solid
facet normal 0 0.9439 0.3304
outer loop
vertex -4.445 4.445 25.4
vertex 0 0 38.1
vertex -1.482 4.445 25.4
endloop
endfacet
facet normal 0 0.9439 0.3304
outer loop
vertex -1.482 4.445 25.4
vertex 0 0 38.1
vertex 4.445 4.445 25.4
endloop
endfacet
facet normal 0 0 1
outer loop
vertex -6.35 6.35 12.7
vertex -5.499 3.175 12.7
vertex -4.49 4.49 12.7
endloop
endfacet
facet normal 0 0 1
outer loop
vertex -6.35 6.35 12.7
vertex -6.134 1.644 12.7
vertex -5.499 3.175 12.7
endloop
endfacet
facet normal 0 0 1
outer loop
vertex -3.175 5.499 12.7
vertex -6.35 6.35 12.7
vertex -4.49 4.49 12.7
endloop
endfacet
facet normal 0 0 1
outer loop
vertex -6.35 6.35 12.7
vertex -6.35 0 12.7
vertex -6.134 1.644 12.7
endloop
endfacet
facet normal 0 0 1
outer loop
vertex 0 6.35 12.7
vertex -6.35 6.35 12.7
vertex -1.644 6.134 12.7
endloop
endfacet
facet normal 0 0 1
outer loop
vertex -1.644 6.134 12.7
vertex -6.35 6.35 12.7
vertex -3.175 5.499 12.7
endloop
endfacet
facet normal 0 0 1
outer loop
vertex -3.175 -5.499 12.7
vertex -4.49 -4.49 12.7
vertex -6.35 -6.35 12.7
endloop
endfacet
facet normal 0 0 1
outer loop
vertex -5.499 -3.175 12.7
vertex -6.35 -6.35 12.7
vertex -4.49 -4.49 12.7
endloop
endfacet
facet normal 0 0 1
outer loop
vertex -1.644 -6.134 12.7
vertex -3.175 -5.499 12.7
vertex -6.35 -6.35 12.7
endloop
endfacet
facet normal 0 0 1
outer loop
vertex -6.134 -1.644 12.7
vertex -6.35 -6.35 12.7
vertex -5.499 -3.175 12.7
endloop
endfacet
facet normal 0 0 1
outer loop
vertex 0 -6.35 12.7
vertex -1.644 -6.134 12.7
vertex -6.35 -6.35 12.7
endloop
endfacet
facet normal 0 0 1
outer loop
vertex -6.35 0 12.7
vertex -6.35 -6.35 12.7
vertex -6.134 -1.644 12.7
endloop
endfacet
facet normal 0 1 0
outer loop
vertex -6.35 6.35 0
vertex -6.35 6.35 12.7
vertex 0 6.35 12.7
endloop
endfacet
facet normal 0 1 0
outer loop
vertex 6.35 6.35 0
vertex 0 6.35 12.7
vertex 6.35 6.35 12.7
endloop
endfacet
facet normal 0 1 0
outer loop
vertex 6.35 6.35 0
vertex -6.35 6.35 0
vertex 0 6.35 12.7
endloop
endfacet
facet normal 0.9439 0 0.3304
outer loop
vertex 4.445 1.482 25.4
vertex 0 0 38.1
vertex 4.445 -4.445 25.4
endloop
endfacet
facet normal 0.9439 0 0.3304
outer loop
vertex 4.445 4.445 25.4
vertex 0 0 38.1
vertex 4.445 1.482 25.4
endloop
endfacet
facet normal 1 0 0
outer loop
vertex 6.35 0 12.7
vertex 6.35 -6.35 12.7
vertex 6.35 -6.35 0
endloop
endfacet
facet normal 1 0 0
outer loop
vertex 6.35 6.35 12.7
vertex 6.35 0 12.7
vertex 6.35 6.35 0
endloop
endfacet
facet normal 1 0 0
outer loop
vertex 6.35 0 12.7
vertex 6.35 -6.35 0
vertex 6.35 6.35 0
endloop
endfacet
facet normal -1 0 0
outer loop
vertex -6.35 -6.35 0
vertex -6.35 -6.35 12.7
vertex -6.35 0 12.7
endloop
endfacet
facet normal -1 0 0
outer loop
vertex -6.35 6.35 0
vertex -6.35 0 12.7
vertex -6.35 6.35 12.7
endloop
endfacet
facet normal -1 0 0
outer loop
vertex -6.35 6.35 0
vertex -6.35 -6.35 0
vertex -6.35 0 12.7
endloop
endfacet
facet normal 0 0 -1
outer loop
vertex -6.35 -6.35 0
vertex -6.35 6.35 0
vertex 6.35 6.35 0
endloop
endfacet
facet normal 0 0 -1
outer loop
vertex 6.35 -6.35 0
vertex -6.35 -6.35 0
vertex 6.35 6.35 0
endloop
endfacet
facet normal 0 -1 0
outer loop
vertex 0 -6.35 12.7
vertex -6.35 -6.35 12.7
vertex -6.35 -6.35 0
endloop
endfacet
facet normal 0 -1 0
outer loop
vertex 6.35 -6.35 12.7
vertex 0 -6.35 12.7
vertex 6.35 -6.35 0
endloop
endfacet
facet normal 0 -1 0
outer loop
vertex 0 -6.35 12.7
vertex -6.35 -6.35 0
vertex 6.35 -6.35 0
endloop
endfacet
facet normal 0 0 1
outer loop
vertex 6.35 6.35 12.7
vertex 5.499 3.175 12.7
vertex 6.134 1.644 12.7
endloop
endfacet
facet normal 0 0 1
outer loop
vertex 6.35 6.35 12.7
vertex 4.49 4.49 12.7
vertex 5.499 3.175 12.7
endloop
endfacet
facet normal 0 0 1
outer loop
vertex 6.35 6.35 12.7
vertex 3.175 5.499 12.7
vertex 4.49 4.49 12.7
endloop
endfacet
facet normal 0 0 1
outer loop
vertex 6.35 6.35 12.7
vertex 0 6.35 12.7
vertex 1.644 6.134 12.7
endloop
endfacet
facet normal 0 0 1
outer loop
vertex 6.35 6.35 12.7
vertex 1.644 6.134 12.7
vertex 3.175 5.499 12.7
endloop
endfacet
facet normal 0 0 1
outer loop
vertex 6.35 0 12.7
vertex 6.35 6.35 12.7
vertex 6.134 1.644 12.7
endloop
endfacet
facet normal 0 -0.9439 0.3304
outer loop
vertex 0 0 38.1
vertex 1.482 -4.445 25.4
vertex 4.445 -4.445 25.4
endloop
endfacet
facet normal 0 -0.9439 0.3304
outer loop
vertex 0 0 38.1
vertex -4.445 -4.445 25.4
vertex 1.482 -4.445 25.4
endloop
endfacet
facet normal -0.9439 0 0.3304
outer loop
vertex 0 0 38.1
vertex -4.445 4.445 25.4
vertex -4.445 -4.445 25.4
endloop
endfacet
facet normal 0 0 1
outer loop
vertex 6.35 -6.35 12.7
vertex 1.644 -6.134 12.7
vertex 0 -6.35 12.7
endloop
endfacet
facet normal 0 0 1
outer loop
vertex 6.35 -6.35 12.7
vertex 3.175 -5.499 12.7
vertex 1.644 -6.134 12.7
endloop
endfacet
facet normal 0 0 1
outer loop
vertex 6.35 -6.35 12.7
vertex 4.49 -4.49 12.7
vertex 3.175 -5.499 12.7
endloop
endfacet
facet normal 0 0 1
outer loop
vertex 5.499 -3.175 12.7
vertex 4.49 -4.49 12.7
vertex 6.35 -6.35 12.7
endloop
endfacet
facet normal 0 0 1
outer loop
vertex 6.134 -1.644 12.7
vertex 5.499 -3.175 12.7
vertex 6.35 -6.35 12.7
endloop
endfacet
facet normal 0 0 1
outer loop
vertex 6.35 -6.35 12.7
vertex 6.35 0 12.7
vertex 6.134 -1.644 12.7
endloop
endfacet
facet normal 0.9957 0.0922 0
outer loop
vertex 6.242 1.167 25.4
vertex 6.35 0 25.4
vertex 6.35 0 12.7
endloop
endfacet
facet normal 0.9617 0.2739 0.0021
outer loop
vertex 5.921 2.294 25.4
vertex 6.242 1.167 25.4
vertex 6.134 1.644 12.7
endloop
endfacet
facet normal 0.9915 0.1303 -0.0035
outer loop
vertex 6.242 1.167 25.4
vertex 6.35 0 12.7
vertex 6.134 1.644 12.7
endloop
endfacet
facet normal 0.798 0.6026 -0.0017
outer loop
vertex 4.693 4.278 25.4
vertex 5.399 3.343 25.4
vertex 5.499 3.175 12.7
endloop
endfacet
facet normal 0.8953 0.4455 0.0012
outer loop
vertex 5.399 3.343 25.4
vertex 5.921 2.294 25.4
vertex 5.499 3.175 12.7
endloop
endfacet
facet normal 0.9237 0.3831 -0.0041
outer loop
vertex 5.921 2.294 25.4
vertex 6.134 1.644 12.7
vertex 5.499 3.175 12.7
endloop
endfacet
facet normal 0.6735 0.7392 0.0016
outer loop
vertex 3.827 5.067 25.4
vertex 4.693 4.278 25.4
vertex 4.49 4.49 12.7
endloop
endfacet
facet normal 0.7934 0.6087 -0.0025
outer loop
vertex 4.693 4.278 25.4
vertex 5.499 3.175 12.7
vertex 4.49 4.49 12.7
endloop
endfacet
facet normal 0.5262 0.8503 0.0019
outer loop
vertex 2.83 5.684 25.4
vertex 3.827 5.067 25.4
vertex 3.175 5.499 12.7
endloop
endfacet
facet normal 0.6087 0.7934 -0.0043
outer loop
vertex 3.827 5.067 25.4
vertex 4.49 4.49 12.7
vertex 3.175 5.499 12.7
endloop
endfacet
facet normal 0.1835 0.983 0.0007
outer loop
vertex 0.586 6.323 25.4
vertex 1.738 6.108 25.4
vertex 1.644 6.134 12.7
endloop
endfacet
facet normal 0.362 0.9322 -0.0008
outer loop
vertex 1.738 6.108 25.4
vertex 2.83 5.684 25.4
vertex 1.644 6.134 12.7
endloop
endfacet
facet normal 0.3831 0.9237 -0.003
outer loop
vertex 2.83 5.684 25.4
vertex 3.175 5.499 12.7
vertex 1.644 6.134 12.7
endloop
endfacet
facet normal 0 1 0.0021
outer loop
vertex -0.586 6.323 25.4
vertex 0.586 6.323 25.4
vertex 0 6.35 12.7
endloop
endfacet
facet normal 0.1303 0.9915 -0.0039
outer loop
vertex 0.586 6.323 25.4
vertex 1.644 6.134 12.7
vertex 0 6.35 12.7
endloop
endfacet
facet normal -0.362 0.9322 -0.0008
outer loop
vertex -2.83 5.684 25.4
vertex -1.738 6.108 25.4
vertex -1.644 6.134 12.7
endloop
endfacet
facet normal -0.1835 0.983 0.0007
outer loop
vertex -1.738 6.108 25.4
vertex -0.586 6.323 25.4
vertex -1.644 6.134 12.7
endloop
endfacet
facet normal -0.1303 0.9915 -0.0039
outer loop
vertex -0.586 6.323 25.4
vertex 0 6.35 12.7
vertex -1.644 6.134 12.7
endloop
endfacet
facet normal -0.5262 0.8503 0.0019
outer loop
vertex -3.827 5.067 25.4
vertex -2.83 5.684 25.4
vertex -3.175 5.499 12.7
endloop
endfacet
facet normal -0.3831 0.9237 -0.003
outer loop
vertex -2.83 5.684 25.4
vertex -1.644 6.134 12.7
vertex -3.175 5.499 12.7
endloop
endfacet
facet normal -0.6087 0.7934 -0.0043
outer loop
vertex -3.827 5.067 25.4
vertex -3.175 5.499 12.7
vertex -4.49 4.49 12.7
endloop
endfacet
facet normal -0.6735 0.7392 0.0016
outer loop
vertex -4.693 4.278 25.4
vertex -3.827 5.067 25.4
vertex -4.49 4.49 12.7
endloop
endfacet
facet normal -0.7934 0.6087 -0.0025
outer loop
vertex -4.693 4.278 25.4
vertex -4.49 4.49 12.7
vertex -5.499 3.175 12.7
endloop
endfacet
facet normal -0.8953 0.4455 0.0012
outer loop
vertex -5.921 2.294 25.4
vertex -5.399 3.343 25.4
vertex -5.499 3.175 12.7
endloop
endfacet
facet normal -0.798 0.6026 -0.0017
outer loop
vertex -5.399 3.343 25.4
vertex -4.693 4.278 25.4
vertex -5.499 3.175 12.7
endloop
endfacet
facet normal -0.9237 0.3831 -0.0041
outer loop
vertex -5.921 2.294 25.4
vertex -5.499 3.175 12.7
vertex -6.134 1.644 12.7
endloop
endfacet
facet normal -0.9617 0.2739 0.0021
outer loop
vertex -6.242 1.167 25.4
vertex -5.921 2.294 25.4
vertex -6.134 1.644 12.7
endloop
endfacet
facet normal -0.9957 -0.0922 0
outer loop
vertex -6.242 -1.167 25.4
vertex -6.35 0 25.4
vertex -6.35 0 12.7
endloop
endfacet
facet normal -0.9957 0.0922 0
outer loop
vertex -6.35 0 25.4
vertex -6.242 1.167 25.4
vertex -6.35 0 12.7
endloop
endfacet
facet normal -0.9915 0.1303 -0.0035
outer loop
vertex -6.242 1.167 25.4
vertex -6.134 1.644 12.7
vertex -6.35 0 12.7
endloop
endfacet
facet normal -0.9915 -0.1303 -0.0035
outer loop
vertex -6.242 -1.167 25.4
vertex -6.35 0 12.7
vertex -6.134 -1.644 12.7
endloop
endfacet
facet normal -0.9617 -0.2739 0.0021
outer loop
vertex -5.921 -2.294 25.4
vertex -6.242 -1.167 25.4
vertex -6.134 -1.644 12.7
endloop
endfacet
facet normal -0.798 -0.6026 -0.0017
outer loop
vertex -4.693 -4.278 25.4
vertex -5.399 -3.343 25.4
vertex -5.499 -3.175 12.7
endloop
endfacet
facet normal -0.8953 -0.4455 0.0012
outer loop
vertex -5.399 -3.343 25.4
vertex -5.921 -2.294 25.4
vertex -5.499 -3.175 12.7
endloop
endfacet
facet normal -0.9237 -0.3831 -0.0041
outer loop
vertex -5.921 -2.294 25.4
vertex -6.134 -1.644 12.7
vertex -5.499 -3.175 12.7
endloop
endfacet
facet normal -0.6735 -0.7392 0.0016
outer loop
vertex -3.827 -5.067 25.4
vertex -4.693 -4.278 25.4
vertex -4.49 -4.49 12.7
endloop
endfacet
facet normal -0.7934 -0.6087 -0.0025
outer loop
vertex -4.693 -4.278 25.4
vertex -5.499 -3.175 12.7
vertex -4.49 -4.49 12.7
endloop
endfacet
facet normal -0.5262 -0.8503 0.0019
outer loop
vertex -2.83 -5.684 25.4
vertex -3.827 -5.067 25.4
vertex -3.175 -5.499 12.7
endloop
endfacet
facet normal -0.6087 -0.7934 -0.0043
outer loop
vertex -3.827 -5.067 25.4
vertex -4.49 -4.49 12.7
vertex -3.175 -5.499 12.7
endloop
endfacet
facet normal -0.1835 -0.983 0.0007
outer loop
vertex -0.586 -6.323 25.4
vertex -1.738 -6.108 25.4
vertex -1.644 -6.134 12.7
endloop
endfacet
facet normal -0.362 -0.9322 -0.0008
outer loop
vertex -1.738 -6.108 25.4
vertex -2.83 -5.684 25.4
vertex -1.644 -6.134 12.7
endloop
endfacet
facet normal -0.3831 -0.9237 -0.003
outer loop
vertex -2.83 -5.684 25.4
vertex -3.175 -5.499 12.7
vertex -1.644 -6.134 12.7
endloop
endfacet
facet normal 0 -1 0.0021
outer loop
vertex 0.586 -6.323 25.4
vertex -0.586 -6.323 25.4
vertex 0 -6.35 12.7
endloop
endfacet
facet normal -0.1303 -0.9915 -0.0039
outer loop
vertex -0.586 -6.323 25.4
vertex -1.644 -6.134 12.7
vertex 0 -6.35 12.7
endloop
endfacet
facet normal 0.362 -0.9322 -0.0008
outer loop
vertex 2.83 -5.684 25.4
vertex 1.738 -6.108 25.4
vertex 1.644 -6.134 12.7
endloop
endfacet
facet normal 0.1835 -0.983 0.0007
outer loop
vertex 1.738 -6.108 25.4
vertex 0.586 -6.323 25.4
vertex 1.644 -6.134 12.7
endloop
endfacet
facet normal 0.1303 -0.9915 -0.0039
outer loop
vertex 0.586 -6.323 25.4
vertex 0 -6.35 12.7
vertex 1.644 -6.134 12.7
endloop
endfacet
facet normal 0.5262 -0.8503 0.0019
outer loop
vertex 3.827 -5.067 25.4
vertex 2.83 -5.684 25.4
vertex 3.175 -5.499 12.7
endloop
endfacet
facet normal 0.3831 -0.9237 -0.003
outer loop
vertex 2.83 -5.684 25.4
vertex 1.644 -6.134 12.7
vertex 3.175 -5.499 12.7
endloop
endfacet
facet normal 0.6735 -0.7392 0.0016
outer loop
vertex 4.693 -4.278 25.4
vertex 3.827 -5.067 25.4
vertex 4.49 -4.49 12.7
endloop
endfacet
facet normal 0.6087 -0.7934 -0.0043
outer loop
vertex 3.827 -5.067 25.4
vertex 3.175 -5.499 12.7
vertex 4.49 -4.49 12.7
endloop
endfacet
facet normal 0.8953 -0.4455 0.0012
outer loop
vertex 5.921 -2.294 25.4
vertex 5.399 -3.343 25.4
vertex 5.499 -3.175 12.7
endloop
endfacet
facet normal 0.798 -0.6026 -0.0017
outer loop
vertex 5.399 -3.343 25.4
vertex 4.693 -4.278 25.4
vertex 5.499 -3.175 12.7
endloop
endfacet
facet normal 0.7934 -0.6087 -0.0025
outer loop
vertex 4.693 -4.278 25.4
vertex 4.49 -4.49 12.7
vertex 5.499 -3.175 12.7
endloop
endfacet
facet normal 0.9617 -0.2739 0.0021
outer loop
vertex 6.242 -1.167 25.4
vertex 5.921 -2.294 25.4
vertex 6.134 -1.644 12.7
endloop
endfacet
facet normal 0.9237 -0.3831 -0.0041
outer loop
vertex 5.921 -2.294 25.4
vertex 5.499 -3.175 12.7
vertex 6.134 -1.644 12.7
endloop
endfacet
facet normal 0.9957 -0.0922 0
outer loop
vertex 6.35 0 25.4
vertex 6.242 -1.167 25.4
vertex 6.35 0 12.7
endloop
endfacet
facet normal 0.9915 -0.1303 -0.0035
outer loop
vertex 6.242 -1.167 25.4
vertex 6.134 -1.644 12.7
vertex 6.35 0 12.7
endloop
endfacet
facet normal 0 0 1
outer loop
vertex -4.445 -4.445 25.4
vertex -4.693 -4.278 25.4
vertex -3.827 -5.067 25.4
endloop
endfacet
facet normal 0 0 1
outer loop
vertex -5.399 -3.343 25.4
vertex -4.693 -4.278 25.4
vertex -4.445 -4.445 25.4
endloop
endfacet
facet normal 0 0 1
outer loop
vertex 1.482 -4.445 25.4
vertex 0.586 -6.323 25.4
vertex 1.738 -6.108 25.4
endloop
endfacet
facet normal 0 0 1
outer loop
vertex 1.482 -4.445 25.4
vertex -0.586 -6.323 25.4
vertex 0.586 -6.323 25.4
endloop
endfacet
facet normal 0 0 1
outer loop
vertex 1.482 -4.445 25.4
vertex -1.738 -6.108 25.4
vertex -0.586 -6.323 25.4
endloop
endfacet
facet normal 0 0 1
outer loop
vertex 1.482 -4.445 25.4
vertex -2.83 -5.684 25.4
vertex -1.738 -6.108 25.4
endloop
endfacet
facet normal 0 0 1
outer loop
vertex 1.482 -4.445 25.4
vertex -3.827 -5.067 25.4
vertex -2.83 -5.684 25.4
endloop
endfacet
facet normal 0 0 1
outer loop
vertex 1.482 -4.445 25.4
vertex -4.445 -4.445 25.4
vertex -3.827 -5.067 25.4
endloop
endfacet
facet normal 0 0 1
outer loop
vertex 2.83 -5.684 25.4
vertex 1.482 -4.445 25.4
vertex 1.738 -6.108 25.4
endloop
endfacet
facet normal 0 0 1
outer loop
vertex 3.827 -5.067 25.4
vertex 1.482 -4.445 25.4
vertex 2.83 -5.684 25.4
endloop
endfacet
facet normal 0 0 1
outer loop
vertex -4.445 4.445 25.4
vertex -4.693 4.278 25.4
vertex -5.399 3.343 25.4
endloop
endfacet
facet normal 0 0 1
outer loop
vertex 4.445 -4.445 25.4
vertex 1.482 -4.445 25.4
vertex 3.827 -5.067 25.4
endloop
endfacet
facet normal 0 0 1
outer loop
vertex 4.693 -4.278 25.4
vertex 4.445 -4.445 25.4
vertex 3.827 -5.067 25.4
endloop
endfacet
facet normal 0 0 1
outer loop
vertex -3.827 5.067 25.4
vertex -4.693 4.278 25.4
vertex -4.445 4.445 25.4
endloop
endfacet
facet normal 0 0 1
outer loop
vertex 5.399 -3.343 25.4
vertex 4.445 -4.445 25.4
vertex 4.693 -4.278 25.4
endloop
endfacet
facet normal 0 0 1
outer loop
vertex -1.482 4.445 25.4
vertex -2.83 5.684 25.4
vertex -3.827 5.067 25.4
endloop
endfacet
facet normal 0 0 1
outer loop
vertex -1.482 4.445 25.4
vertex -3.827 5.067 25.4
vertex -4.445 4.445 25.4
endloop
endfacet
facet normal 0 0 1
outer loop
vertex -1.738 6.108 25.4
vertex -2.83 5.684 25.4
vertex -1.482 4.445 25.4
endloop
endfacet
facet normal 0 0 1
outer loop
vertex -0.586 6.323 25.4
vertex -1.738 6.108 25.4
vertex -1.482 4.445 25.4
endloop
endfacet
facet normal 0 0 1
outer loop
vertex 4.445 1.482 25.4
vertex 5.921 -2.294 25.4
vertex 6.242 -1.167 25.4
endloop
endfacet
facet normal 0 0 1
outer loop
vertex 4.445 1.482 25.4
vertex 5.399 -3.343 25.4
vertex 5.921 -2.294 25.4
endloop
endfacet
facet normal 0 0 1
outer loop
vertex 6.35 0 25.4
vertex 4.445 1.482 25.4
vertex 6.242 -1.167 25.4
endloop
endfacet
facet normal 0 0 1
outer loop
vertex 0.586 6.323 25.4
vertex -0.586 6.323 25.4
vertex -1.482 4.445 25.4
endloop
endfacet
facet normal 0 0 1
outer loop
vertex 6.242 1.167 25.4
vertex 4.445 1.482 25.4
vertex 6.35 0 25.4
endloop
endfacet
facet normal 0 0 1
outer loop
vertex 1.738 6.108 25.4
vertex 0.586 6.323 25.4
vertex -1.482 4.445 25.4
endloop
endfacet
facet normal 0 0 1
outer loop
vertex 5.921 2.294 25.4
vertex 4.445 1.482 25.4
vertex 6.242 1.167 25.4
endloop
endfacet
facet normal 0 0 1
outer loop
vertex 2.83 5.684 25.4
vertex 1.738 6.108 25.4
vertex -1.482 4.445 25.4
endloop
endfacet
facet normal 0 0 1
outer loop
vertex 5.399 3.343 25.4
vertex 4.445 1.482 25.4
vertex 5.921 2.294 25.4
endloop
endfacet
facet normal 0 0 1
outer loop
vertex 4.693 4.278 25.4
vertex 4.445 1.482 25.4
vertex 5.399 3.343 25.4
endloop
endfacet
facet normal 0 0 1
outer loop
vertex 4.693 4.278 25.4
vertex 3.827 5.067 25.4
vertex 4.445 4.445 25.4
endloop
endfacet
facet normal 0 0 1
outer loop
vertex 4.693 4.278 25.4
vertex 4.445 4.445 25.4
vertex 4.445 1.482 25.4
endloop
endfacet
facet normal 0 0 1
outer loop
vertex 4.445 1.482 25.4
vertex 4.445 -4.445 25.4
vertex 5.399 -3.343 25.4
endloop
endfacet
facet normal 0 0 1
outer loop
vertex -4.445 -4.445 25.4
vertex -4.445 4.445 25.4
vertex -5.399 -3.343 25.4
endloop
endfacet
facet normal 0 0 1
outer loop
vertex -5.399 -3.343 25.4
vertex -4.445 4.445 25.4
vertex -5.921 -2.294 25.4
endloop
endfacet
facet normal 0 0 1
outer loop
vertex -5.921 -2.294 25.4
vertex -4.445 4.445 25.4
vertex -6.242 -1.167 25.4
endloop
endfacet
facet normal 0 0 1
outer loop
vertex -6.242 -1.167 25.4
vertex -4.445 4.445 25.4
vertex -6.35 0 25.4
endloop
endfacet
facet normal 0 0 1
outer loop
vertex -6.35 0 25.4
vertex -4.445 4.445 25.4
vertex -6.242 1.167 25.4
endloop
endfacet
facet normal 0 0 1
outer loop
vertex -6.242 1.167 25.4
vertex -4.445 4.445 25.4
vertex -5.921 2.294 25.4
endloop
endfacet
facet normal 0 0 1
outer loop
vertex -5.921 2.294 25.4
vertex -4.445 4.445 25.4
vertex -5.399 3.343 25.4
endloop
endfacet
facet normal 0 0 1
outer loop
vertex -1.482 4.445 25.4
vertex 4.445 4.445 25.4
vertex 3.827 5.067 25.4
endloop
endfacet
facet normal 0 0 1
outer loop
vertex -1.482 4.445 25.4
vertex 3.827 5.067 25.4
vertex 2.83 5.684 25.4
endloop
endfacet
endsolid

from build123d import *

# Parameters (mm, degrees)
F0_W          = 12.7
F0_H          = 12.7
F1_DEPTH      = 12.7
F2_R          = 6.35
F3_DEPTH      = 12.7
F4_W          = 12.7
F4_H          = 12.7
F5_DEPTH      = 12.7
F7_DEPTH      = 6.351
F7_DEPTH_BACK = 6.351
F9_DEPTH      = 6.351
F9_DEPTH_BACK = 6.351


with BuildPart() as f1:
    # F0 (on Top) → F1 (new body)
    with BuildSketch(Plane.XY):
        Rectangle(F0_W, F0_H)
    extrude(amount=F1_DEPTH)

    # F2 (on face) → F3 (join)
    with BuildSketch(Plane.XY.offset(12.7)):
        Circle(F2_R)
    extrude(amount=F3_DEPTH)

    # F4 (on face) → F5 (join)
    with BuildSketch(Plane.XY.offset(25.4)):
        Rectangle(F4_W, F4_H)
    extrude(amount=F5_DEPTH)

    # F6 (on Front) → F7 (cut, two sides)
    with BuildSketch(Plane.XZ) as f7_sk:
        Polygon((-4.445, 25.4), (0, 38.1), (-6.35, 38.1), (-6.35, 25.4), align=None)
        Polygon((4.445, 25.4), (6.35, 25.4), (6.35, 38.1), (0, 38.1), align=None)
    extrude(amount=-F7_DEPTH, mode=Mode.SUBTRACT)
    extrude(f7_sk.sketch, amount=F7_DEPTH_BACK, mode=Mode.SUBTRACT)

    # F8 (on Right) → F9 (cut, two sides)
    with BuildSketch(Plane.YZ) as f9_sk:
        Polygon((1.4e-09, 38.1), (-6.35, 38.1), (-6.35, 25.4), (-4.4449999986, 25.4), align=None)
        Polygon((6.35, 38.1), (1.4e-09, 38.1), (4.4450000014, 25.4), (6.35, 25.4), align=None)
    extrude(amount=-F9_DEPTH, mode=Mode.SUBTRACT)
    extrude(f9_sk.sketch, amount=F9_DEPTH_BACK, mode=Mode.SUBTRACT)


solid = f1.part
